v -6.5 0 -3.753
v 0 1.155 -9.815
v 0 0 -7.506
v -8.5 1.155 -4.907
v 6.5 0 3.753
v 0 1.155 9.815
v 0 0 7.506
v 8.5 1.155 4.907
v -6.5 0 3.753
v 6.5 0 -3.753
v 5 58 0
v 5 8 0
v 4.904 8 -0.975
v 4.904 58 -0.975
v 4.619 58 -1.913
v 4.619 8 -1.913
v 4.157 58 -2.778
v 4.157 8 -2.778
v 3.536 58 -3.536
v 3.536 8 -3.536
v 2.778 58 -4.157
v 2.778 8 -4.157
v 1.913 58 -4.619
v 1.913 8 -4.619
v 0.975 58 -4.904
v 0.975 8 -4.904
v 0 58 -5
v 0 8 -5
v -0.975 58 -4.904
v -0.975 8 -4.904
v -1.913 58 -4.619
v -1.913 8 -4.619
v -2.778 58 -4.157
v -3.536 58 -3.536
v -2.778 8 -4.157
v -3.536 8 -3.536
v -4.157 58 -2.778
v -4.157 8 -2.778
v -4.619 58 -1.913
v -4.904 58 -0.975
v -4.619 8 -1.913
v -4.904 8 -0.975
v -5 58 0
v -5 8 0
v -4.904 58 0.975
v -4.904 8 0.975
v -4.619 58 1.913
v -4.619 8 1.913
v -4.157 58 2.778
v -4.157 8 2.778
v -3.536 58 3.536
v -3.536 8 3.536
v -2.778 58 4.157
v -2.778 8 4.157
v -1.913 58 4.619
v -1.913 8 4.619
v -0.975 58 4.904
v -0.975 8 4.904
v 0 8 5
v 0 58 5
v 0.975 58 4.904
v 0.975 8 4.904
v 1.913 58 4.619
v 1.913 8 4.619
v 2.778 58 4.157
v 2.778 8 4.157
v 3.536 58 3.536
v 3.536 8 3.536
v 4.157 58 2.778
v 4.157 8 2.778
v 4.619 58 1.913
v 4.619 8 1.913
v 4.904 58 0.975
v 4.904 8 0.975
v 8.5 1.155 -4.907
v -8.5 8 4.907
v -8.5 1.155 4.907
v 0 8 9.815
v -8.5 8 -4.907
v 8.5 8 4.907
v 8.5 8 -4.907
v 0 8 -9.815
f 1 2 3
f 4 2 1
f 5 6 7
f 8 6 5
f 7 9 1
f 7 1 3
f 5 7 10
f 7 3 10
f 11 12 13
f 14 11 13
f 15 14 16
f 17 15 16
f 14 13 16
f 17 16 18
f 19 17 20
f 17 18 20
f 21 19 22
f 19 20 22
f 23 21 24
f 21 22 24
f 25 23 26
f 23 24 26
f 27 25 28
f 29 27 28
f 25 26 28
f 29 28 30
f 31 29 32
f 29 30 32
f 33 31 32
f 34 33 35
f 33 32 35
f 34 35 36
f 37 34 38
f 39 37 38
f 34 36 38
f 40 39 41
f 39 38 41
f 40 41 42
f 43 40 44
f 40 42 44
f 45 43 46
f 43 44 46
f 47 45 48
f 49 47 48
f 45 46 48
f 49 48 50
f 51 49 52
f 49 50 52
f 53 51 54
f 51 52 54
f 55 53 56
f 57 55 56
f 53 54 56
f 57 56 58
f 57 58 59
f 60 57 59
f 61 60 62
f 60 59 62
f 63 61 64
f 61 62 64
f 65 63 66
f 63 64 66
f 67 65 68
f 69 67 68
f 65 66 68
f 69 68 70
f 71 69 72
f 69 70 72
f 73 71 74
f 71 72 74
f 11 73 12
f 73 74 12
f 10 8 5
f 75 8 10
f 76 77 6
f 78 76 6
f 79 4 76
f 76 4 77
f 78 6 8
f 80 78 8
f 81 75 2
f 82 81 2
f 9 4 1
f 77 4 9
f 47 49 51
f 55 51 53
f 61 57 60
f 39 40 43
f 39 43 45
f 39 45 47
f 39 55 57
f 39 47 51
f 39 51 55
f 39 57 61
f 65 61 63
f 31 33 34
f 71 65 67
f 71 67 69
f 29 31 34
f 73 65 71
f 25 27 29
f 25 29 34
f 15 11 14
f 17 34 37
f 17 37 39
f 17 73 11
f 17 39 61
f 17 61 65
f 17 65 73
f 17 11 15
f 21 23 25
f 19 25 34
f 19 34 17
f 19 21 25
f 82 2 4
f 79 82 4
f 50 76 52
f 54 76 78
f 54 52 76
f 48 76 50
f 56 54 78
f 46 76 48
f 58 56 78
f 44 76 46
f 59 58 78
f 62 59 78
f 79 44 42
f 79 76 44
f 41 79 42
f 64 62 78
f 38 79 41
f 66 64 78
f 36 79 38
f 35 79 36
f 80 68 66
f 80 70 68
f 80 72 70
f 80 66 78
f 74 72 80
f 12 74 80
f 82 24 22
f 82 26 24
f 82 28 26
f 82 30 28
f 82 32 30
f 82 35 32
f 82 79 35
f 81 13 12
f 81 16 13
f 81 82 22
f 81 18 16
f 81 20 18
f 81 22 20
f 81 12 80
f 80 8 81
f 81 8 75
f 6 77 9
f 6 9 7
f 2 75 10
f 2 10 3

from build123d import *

# Parameters (mm, degrees)
EXTRUDE_1_DEPTH = 8
SKETCH_2_R      = 5
EXTRUDE_2_DEPTH = 50
CHAMFER_1_SIZE  = 2
CHAMFER_1_SIZE2 = 1.154700538


with BuildPart() as part:
    # Эскиз1 → Бобышка-Вытянуть1 (new body)
    with BuildSketch(Plane(origin=(0, 0, 0), x_dir=(1, 0, 0), z_dir=(0, 1, 0))):
        Polygon((8.5, -4.907477288), (8.5, 4.907477288), (0, 9.814954576), (-8.5, 4.907477288), (-8.5, -4.907477288), (0, -9.814954576), align=None)
    extrude(amount=EXTRUDE_1_DEPTH)

    # Эскиз2 → Бобышка-Вытянуть2 (add)
    with BuildSketch(Plane(origin=(0, 8, 0), x_dir=(1, 0, 0), z_dir=(0, 1, 0))):
        Circle(SKETCH_2_R)
    extrude(amount=EXTRUDE_2_DEPTH)

    # Фаска1
    chamfer_1_edges = [part.edges().sort_by_distance(p)[0] for p in [
        (-4.25, 0, 7.361215932),
        (-8.5, 0, 0),
        (-4.25, 0, -7.361215932),
        (4.25, 0, -7.361215932),
        (8.5, 0, 0),
        (4.25, 0, 7.361215932),
    ]]
    chamfer_1_side = [part.faces().sort_by_distance(p)[0] for p in [
        (0, 0, 0),
    ]]
    chamfer(chamfer_1_edges, length=CHAMFER_1_SIZE, length2=CHAMFER_1_SIZE2, reference=chamfer_1_side[0])


solid = part.part
